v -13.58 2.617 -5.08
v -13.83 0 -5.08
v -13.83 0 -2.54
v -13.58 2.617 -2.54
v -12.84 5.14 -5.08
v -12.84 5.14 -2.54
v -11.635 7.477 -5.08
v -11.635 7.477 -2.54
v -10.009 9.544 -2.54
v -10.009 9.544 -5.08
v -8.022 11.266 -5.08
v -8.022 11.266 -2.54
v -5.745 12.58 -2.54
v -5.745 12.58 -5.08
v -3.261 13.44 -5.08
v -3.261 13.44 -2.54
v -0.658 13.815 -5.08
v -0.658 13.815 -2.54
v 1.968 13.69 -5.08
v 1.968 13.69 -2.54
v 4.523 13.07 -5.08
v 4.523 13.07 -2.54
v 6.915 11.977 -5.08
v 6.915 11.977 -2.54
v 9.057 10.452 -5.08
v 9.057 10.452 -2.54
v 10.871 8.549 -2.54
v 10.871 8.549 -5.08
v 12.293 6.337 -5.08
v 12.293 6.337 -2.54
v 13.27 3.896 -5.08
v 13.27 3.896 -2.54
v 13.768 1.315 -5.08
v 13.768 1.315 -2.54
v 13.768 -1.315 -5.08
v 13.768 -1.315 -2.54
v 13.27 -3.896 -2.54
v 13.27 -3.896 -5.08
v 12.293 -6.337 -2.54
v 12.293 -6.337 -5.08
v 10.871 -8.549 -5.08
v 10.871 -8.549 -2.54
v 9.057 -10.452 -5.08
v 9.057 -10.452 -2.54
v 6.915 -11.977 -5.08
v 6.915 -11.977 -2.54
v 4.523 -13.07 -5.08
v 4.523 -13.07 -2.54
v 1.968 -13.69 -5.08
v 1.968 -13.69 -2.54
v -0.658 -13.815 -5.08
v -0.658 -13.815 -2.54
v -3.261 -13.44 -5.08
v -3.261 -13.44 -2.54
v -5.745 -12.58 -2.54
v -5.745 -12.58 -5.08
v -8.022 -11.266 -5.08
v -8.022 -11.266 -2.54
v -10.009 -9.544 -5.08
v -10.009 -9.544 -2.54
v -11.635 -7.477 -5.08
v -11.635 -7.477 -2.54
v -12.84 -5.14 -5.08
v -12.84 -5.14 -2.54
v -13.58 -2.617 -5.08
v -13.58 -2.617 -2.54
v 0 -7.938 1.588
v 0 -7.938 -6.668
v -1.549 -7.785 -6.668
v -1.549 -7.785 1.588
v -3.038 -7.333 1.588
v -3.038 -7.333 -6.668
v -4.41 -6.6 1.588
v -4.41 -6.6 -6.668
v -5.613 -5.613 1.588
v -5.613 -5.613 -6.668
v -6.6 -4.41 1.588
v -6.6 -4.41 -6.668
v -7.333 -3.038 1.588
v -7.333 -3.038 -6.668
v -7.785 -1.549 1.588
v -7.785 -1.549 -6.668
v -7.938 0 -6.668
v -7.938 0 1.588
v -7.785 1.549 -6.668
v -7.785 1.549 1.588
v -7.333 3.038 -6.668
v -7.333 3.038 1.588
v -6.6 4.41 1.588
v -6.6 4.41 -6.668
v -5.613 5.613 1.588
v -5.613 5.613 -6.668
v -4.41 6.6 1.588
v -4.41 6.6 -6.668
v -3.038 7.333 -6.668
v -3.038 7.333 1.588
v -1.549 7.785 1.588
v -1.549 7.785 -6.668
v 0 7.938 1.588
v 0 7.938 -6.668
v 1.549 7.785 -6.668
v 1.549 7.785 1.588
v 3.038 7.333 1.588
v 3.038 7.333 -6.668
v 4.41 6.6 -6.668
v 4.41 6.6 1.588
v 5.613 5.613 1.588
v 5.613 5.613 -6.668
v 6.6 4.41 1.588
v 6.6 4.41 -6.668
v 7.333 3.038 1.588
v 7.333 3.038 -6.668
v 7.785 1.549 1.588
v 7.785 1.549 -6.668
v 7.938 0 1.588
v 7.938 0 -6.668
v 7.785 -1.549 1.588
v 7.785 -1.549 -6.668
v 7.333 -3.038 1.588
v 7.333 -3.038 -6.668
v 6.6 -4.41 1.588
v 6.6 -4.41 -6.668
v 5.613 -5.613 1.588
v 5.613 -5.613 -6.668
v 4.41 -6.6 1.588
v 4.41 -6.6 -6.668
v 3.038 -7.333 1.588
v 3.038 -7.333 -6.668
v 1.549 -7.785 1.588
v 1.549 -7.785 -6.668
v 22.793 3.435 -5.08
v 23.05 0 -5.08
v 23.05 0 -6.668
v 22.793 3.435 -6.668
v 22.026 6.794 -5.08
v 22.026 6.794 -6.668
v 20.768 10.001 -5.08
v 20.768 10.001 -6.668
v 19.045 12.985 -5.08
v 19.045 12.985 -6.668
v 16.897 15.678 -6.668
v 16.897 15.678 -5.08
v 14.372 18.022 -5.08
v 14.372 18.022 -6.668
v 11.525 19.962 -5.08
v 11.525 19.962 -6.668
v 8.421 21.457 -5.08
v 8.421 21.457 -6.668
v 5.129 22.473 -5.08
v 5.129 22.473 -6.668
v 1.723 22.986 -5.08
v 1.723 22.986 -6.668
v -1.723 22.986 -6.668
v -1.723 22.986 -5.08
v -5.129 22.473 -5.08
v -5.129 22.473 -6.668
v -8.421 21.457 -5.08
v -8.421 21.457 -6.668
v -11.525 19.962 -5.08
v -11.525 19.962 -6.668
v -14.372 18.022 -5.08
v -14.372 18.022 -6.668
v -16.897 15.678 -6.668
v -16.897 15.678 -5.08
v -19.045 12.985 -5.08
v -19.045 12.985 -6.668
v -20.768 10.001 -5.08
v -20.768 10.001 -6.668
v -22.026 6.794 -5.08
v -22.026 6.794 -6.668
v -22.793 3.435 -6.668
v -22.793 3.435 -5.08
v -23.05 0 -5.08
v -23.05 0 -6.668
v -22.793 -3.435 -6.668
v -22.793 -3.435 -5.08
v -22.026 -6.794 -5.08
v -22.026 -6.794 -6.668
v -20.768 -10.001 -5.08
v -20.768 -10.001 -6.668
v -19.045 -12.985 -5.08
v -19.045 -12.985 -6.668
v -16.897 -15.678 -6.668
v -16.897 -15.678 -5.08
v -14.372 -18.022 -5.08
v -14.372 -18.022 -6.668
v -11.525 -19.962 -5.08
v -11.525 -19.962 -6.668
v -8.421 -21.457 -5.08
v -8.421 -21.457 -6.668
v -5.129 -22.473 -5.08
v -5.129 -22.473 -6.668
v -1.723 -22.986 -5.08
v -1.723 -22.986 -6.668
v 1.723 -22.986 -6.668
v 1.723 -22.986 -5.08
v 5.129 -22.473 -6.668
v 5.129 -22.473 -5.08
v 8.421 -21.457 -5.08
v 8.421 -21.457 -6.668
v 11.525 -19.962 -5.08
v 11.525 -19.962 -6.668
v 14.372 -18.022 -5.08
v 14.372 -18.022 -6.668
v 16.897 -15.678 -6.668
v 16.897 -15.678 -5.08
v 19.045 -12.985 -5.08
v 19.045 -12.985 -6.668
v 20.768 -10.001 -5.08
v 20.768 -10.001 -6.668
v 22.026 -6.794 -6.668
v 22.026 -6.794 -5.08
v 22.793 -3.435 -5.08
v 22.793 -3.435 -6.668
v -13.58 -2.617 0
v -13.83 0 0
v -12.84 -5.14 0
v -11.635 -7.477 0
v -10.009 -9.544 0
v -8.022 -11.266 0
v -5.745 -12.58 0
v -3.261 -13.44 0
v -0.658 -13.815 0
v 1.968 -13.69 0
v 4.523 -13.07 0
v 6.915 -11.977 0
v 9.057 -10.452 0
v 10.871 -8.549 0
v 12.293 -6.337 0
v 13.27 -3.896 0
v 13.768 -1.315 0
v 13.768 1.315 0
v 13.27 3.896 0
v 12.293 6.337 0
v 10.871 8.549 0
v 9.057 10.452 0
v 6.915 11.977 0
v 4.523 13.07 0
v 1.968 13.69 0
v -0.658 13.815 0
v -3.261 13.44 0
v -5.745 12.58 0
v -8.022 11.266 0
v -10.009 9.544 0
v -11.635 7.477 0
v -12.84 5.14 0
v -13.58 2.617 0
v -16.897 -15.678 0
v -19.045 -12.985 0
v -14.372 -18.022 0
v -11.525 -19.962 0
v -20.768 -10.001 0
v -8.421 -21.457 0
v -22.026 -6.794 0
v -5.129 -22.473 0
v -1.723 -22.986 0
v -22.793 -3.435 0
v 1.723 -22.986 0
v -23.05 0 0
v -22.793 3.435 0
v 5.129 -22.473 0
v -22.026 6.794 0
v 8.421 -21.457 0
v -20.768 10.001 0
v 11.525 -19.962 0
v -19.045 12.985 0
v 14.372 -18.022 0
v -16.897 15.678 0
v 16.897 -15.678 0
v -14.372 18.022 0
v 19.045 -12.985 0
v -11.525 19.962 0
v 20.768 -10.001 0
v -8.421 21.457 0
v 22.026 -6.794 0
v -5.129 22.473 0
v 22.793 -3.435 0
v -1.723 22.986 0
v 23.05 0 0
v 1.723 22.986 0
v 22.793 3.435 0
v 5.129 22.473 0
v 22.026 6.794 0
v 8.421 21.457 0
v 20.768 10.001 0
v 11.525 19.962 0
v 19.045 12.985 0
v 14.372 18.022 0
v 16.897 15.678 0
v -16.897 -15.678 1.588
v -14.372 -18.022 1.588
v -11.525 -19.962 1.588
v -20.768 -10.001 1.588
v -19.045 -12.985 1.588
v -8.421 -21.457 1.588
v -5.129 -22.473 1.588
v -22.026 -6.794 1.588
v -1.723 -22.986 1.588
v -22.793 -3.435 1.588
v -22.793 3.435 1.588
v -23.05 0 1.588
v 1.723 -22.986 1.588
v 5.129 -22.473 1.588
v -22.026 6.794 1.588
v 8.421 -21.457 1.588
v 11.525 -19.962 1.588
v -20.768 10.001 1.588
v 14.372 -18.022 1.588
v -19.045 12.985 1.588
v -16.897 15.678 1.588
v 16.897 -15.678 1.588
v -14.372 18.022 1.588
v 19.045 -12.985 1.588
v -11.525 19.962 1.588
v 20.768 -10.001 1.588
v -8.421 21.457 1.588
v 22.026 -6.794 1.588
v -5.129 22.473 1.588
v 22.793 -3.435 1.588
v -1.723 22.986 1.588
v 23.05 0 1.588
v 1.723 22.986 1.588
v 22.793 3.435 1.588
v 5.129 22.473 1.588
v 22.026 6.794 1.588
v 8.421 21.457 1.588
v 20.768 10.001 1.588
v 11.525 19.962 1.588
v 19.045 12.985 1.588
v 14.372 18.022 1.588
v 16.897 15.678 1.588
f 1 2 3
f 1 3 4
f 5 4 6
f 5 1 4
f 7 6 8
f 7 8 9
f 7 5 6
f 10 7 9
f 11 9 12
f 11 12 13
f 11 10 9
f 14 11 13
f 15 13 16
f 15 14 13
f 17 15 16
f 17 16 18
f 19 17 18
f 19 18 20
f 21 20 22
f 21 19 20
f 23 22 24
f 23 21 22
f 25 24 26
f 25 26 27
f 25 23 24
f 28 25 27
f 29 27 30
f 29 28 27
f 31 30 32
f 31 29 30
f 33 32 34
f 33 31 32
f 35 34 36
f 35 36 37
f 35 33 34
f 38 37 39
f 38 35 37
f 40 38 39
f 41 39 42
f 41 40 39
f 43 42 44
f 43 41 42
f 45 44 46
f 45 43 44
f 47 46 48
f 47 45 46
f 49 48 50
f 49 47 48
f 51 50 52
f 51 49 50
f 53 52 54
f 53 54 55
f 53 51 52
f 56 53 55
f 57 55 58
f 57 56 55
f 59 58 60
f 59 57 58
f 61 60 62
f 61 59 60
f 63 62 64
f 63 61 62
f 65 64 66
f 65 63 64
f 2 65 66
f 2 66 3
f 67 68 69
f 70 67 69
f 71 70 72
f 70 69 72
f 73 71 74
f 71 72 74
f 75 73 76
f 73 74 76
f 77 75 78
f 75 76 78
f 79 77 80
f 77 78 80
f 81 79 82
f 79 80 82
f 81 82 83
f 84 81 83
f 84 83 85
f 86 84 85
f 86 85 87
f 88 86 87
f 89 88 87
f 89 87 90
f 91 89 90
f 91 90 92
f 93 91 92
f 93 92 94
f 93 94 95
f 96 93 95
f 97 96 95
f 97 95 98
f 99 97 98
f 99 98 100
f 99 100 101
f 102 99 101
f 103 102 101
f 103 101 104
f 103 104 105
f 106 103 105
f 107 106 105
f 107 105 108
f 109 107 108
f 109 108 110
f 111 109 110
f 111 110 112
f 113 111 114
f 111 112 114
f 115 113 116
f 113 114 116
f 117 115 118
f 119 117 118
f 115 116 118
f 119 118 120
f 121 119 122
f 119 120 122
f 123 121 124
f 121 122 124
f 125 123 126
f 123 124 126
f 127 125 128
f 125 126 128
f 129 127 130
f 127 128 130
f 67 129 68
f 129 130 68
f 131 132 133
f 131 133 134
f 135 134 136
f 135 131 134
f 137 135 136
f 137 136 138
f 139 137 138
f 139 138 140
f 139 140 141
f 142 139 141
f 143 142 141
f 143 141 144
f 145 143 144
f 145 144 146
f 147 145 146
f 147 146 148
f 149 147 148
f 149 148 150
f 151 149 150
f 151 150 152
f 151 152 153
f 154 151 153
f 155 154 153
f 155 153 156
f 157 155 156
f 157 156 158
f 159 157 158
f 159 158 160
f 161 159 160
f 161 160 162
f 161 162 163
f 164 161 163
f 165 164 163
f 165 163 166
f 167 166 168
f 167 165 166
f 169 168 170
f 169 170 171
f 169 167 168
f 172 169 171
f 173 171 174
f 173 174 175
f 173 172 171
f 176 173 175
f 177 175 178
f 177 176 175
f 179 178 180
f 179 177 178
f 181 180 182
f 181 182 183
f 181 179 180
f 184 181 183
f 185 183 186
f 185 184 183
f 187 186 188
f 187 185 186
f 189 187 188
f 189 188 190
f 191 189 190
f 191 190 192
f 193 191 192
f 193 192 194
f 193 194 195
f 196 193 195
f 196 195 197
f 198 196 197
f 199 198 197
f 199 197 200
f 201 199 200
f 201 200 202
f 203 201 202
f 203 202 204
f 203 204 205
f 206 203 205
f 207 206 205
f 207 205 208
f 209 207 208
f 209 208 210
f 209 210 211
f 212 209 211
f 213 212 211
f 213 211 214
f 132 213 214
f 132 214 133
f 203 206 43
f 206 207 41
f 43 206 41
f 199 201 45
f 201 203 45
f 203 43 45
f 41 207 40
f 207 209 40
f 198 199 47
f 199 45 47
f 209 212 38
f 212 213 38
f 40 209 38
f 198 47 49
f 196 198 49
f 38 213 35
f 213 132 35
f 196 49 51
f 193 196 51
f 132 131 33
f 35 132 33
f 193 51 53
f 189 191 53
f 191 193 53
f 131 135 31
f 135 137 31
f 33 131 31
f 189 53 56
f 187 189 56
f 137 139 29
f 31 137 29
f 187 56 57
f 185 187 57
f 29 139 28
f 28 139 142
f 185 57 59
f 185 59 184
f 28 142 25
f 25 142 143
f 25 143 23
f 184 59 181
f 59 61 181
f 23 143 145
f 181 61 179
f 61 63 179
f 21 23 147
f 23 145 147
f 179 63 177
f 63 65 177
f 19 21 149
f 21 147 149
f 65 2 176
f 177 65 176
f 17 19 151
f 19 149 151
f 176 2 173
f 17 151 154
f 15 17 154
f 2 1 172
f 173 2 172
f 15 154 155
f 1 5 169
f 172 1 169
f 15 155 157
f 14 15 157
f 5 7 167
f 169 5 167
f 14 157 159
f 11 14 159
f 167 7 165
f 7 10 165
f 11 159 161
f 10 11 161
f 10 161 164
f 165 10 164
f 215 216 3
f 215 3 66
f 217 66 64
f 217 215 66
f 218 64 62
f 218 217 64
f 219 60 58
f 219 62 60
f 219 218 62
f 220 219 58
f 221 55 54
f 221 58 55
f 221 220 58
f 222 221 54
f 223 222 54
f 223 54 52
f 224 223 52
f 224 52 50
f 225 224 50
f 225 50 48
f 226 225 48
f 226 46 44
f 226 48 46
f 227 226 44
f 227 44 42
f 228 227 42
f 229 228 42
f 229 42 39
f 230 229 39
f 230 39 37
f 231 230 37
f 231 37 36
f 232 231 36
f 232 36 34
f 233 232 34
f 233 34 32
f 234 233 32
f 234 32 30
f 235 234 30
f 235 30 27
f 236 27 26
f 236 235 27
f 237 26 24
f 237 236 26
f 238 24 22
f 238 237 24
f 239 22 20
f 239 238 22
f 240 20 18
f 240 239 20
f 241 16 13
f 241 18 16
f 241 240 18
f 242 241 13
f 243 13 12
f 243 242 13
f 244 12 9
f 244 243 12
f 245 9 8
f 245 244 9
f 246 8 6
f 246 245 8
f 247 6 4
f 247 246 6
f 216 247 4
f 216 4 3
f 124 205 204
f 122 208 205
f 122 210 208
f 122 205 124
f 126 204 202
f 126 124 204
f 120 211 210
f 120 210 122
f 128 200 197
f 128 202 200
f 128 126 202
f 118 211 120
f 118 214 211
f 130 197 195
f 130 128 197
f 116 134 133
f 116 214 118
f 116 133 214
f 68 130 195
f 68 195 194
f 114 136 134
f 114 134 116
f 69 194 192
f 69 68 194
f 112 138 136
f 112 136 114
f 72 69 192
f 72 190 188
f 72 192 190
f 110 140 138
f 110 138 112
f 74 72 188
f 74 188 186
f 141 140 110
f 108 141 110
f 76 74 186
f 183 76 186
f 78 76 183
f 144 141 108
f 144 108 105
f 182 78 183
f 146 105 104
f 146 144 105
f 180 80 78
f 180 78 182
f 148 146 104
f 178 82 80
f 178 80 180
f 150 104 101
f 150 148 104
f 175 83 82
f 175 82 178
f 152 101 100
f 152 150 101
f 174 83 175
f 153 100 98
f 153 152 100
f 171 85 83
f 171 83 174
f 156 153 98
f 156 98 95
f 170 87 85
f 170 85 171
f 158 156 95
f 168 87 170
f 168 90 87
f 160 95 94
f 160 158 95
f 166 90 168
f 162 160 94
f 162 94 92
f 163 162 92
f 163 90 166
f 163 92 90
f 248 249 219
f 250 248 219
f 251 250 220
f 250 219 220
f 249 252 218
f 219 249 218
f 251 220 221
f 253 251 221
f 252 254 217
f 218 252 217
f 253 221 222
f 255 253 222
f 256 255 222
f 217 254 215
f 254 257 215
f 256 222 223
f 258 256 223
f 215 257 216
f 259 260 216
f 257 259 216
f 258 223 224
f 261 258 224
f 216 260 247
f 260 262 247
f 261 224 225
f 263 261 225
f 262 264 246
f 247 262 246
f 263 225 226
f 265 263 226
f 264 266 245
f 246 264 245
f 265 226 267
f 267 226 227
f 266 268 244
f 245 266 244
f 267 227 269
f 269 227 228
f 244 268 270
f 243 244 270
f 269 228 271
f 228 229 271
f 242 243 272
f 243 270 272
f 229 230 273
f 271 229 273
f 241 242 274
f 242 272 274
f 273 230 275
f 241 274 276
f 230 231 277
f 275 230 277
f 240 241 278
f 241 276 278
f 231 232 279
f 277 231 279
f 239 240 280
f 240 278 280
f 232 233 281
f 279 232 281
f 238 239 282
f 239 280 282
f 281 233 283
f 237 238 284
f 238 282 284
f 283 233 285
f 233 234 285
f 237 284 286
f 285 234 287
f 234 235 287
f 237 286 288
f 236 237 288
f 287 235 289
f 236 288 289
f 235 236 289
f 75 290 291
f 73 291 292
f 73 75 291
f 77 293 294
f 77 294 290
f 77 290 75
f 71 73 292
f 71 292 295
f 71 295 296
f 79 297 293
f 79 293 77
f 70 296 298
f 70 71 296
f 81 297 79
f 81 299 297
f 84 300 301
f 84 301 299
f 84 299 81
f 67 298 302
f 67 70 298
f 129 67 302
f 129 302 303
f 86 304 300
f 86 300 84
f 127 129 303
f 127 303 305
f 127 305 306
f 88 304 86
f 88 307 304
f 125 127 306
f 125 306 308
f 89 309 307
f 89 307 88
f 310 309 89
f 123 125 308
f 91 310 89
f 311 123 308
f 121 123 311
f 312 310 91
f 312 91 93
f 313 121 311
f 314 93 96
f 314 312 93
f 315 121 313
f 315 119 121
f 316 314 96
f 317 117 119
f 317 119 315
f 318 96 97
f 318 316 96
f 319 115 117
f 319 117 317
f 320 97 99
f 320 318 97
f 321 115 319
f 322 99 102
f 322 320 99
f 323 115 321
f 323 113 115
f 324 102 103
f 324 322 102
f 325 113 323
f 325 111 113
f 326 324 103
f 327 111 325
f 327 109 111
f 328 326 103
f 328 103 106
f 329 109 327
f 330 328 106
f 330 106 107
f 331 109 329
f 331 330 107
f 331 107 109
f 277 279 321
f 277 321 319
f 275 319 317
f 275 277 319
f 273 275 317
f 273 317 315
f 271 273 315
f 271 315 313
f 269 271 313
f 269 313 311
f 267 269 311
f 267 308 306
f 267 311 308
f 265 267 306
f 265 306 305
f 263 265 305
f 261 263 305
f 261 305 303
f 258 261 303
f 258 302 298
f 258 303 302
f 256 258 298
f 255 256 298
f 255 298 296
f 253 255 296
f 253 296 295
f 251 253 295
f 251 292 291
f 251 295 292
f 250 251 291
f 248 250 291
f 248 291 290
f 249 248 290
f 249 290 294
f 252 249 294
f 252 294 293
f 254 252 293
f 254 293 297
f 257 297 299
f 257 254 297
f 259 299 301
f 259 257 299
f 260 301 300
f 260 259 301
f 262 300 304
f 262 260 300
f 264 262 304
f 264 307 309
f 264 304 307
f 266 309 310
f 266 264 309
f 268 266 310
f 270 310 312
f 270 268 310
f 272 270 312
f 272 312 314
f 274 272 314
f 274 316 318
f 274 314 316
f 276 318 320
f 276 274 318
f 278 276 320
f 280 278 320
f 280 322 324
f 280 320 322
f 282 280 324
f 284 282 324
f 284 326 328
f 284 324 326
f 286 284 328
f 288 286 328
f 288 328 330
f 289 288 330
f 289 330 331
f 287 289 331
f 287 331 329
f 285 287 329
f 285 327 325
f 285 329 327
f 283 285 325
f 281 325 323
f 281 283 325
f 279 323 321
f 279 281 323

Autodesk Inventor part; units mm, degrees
ref_plane "YZ Plane" through (0, 0, 0) normal (1, 0, 0) x (0, 1, 0)
ref_plane "XZ Plane" through (0, 0, 0) normal (0, 1, 0) x (-1, 0, 0)
sketch "Sketch1" plane through (0, 0, 0) normal (0, 0, 1) x (1, 0, 0)
  circle A0 centre (0, 0) radius 23.0505
  dimension "d0" = 46.101
extrude "Extrusion1" add sketch "Sketch1" along normal blind 1.5875
sketch "Sketch4" plane through (0, 0, 0) normal (0, 0, -1) x (-1, 0, 0)
  circle A0 centre (0, 0) radius 13.8303
  circle A1 centre (0, 0) radius 23.0505 projected
  dimension "d14" = 27.6606
extrude "Extrusion2" add sketch "Sketch4" along normal blind 2.54 contours A0
ref_plane "Work Plane2" through (0, 0, -2.54) normal (0, 0, -1) x (-1, 0, 0)
mirror "Mirror1" about plane through (0, 0, -2.54) normal (0, 0, -1) of "Extrusion1", "Extrusion2"
sketch "Sketch5" plane through (0, 0, 1.5875) normal (0, 0, 1) x (1, 0, 0)
  point P0 (0, 0)
  point P1 (0, 0)
hole "Hole1" at (0, 0, 1.5875) direction (0, 0, -1) diameter 15.875 end through all
properties part number "CLB_072_ScissorPulley" material "PC/ABS Plastic"
